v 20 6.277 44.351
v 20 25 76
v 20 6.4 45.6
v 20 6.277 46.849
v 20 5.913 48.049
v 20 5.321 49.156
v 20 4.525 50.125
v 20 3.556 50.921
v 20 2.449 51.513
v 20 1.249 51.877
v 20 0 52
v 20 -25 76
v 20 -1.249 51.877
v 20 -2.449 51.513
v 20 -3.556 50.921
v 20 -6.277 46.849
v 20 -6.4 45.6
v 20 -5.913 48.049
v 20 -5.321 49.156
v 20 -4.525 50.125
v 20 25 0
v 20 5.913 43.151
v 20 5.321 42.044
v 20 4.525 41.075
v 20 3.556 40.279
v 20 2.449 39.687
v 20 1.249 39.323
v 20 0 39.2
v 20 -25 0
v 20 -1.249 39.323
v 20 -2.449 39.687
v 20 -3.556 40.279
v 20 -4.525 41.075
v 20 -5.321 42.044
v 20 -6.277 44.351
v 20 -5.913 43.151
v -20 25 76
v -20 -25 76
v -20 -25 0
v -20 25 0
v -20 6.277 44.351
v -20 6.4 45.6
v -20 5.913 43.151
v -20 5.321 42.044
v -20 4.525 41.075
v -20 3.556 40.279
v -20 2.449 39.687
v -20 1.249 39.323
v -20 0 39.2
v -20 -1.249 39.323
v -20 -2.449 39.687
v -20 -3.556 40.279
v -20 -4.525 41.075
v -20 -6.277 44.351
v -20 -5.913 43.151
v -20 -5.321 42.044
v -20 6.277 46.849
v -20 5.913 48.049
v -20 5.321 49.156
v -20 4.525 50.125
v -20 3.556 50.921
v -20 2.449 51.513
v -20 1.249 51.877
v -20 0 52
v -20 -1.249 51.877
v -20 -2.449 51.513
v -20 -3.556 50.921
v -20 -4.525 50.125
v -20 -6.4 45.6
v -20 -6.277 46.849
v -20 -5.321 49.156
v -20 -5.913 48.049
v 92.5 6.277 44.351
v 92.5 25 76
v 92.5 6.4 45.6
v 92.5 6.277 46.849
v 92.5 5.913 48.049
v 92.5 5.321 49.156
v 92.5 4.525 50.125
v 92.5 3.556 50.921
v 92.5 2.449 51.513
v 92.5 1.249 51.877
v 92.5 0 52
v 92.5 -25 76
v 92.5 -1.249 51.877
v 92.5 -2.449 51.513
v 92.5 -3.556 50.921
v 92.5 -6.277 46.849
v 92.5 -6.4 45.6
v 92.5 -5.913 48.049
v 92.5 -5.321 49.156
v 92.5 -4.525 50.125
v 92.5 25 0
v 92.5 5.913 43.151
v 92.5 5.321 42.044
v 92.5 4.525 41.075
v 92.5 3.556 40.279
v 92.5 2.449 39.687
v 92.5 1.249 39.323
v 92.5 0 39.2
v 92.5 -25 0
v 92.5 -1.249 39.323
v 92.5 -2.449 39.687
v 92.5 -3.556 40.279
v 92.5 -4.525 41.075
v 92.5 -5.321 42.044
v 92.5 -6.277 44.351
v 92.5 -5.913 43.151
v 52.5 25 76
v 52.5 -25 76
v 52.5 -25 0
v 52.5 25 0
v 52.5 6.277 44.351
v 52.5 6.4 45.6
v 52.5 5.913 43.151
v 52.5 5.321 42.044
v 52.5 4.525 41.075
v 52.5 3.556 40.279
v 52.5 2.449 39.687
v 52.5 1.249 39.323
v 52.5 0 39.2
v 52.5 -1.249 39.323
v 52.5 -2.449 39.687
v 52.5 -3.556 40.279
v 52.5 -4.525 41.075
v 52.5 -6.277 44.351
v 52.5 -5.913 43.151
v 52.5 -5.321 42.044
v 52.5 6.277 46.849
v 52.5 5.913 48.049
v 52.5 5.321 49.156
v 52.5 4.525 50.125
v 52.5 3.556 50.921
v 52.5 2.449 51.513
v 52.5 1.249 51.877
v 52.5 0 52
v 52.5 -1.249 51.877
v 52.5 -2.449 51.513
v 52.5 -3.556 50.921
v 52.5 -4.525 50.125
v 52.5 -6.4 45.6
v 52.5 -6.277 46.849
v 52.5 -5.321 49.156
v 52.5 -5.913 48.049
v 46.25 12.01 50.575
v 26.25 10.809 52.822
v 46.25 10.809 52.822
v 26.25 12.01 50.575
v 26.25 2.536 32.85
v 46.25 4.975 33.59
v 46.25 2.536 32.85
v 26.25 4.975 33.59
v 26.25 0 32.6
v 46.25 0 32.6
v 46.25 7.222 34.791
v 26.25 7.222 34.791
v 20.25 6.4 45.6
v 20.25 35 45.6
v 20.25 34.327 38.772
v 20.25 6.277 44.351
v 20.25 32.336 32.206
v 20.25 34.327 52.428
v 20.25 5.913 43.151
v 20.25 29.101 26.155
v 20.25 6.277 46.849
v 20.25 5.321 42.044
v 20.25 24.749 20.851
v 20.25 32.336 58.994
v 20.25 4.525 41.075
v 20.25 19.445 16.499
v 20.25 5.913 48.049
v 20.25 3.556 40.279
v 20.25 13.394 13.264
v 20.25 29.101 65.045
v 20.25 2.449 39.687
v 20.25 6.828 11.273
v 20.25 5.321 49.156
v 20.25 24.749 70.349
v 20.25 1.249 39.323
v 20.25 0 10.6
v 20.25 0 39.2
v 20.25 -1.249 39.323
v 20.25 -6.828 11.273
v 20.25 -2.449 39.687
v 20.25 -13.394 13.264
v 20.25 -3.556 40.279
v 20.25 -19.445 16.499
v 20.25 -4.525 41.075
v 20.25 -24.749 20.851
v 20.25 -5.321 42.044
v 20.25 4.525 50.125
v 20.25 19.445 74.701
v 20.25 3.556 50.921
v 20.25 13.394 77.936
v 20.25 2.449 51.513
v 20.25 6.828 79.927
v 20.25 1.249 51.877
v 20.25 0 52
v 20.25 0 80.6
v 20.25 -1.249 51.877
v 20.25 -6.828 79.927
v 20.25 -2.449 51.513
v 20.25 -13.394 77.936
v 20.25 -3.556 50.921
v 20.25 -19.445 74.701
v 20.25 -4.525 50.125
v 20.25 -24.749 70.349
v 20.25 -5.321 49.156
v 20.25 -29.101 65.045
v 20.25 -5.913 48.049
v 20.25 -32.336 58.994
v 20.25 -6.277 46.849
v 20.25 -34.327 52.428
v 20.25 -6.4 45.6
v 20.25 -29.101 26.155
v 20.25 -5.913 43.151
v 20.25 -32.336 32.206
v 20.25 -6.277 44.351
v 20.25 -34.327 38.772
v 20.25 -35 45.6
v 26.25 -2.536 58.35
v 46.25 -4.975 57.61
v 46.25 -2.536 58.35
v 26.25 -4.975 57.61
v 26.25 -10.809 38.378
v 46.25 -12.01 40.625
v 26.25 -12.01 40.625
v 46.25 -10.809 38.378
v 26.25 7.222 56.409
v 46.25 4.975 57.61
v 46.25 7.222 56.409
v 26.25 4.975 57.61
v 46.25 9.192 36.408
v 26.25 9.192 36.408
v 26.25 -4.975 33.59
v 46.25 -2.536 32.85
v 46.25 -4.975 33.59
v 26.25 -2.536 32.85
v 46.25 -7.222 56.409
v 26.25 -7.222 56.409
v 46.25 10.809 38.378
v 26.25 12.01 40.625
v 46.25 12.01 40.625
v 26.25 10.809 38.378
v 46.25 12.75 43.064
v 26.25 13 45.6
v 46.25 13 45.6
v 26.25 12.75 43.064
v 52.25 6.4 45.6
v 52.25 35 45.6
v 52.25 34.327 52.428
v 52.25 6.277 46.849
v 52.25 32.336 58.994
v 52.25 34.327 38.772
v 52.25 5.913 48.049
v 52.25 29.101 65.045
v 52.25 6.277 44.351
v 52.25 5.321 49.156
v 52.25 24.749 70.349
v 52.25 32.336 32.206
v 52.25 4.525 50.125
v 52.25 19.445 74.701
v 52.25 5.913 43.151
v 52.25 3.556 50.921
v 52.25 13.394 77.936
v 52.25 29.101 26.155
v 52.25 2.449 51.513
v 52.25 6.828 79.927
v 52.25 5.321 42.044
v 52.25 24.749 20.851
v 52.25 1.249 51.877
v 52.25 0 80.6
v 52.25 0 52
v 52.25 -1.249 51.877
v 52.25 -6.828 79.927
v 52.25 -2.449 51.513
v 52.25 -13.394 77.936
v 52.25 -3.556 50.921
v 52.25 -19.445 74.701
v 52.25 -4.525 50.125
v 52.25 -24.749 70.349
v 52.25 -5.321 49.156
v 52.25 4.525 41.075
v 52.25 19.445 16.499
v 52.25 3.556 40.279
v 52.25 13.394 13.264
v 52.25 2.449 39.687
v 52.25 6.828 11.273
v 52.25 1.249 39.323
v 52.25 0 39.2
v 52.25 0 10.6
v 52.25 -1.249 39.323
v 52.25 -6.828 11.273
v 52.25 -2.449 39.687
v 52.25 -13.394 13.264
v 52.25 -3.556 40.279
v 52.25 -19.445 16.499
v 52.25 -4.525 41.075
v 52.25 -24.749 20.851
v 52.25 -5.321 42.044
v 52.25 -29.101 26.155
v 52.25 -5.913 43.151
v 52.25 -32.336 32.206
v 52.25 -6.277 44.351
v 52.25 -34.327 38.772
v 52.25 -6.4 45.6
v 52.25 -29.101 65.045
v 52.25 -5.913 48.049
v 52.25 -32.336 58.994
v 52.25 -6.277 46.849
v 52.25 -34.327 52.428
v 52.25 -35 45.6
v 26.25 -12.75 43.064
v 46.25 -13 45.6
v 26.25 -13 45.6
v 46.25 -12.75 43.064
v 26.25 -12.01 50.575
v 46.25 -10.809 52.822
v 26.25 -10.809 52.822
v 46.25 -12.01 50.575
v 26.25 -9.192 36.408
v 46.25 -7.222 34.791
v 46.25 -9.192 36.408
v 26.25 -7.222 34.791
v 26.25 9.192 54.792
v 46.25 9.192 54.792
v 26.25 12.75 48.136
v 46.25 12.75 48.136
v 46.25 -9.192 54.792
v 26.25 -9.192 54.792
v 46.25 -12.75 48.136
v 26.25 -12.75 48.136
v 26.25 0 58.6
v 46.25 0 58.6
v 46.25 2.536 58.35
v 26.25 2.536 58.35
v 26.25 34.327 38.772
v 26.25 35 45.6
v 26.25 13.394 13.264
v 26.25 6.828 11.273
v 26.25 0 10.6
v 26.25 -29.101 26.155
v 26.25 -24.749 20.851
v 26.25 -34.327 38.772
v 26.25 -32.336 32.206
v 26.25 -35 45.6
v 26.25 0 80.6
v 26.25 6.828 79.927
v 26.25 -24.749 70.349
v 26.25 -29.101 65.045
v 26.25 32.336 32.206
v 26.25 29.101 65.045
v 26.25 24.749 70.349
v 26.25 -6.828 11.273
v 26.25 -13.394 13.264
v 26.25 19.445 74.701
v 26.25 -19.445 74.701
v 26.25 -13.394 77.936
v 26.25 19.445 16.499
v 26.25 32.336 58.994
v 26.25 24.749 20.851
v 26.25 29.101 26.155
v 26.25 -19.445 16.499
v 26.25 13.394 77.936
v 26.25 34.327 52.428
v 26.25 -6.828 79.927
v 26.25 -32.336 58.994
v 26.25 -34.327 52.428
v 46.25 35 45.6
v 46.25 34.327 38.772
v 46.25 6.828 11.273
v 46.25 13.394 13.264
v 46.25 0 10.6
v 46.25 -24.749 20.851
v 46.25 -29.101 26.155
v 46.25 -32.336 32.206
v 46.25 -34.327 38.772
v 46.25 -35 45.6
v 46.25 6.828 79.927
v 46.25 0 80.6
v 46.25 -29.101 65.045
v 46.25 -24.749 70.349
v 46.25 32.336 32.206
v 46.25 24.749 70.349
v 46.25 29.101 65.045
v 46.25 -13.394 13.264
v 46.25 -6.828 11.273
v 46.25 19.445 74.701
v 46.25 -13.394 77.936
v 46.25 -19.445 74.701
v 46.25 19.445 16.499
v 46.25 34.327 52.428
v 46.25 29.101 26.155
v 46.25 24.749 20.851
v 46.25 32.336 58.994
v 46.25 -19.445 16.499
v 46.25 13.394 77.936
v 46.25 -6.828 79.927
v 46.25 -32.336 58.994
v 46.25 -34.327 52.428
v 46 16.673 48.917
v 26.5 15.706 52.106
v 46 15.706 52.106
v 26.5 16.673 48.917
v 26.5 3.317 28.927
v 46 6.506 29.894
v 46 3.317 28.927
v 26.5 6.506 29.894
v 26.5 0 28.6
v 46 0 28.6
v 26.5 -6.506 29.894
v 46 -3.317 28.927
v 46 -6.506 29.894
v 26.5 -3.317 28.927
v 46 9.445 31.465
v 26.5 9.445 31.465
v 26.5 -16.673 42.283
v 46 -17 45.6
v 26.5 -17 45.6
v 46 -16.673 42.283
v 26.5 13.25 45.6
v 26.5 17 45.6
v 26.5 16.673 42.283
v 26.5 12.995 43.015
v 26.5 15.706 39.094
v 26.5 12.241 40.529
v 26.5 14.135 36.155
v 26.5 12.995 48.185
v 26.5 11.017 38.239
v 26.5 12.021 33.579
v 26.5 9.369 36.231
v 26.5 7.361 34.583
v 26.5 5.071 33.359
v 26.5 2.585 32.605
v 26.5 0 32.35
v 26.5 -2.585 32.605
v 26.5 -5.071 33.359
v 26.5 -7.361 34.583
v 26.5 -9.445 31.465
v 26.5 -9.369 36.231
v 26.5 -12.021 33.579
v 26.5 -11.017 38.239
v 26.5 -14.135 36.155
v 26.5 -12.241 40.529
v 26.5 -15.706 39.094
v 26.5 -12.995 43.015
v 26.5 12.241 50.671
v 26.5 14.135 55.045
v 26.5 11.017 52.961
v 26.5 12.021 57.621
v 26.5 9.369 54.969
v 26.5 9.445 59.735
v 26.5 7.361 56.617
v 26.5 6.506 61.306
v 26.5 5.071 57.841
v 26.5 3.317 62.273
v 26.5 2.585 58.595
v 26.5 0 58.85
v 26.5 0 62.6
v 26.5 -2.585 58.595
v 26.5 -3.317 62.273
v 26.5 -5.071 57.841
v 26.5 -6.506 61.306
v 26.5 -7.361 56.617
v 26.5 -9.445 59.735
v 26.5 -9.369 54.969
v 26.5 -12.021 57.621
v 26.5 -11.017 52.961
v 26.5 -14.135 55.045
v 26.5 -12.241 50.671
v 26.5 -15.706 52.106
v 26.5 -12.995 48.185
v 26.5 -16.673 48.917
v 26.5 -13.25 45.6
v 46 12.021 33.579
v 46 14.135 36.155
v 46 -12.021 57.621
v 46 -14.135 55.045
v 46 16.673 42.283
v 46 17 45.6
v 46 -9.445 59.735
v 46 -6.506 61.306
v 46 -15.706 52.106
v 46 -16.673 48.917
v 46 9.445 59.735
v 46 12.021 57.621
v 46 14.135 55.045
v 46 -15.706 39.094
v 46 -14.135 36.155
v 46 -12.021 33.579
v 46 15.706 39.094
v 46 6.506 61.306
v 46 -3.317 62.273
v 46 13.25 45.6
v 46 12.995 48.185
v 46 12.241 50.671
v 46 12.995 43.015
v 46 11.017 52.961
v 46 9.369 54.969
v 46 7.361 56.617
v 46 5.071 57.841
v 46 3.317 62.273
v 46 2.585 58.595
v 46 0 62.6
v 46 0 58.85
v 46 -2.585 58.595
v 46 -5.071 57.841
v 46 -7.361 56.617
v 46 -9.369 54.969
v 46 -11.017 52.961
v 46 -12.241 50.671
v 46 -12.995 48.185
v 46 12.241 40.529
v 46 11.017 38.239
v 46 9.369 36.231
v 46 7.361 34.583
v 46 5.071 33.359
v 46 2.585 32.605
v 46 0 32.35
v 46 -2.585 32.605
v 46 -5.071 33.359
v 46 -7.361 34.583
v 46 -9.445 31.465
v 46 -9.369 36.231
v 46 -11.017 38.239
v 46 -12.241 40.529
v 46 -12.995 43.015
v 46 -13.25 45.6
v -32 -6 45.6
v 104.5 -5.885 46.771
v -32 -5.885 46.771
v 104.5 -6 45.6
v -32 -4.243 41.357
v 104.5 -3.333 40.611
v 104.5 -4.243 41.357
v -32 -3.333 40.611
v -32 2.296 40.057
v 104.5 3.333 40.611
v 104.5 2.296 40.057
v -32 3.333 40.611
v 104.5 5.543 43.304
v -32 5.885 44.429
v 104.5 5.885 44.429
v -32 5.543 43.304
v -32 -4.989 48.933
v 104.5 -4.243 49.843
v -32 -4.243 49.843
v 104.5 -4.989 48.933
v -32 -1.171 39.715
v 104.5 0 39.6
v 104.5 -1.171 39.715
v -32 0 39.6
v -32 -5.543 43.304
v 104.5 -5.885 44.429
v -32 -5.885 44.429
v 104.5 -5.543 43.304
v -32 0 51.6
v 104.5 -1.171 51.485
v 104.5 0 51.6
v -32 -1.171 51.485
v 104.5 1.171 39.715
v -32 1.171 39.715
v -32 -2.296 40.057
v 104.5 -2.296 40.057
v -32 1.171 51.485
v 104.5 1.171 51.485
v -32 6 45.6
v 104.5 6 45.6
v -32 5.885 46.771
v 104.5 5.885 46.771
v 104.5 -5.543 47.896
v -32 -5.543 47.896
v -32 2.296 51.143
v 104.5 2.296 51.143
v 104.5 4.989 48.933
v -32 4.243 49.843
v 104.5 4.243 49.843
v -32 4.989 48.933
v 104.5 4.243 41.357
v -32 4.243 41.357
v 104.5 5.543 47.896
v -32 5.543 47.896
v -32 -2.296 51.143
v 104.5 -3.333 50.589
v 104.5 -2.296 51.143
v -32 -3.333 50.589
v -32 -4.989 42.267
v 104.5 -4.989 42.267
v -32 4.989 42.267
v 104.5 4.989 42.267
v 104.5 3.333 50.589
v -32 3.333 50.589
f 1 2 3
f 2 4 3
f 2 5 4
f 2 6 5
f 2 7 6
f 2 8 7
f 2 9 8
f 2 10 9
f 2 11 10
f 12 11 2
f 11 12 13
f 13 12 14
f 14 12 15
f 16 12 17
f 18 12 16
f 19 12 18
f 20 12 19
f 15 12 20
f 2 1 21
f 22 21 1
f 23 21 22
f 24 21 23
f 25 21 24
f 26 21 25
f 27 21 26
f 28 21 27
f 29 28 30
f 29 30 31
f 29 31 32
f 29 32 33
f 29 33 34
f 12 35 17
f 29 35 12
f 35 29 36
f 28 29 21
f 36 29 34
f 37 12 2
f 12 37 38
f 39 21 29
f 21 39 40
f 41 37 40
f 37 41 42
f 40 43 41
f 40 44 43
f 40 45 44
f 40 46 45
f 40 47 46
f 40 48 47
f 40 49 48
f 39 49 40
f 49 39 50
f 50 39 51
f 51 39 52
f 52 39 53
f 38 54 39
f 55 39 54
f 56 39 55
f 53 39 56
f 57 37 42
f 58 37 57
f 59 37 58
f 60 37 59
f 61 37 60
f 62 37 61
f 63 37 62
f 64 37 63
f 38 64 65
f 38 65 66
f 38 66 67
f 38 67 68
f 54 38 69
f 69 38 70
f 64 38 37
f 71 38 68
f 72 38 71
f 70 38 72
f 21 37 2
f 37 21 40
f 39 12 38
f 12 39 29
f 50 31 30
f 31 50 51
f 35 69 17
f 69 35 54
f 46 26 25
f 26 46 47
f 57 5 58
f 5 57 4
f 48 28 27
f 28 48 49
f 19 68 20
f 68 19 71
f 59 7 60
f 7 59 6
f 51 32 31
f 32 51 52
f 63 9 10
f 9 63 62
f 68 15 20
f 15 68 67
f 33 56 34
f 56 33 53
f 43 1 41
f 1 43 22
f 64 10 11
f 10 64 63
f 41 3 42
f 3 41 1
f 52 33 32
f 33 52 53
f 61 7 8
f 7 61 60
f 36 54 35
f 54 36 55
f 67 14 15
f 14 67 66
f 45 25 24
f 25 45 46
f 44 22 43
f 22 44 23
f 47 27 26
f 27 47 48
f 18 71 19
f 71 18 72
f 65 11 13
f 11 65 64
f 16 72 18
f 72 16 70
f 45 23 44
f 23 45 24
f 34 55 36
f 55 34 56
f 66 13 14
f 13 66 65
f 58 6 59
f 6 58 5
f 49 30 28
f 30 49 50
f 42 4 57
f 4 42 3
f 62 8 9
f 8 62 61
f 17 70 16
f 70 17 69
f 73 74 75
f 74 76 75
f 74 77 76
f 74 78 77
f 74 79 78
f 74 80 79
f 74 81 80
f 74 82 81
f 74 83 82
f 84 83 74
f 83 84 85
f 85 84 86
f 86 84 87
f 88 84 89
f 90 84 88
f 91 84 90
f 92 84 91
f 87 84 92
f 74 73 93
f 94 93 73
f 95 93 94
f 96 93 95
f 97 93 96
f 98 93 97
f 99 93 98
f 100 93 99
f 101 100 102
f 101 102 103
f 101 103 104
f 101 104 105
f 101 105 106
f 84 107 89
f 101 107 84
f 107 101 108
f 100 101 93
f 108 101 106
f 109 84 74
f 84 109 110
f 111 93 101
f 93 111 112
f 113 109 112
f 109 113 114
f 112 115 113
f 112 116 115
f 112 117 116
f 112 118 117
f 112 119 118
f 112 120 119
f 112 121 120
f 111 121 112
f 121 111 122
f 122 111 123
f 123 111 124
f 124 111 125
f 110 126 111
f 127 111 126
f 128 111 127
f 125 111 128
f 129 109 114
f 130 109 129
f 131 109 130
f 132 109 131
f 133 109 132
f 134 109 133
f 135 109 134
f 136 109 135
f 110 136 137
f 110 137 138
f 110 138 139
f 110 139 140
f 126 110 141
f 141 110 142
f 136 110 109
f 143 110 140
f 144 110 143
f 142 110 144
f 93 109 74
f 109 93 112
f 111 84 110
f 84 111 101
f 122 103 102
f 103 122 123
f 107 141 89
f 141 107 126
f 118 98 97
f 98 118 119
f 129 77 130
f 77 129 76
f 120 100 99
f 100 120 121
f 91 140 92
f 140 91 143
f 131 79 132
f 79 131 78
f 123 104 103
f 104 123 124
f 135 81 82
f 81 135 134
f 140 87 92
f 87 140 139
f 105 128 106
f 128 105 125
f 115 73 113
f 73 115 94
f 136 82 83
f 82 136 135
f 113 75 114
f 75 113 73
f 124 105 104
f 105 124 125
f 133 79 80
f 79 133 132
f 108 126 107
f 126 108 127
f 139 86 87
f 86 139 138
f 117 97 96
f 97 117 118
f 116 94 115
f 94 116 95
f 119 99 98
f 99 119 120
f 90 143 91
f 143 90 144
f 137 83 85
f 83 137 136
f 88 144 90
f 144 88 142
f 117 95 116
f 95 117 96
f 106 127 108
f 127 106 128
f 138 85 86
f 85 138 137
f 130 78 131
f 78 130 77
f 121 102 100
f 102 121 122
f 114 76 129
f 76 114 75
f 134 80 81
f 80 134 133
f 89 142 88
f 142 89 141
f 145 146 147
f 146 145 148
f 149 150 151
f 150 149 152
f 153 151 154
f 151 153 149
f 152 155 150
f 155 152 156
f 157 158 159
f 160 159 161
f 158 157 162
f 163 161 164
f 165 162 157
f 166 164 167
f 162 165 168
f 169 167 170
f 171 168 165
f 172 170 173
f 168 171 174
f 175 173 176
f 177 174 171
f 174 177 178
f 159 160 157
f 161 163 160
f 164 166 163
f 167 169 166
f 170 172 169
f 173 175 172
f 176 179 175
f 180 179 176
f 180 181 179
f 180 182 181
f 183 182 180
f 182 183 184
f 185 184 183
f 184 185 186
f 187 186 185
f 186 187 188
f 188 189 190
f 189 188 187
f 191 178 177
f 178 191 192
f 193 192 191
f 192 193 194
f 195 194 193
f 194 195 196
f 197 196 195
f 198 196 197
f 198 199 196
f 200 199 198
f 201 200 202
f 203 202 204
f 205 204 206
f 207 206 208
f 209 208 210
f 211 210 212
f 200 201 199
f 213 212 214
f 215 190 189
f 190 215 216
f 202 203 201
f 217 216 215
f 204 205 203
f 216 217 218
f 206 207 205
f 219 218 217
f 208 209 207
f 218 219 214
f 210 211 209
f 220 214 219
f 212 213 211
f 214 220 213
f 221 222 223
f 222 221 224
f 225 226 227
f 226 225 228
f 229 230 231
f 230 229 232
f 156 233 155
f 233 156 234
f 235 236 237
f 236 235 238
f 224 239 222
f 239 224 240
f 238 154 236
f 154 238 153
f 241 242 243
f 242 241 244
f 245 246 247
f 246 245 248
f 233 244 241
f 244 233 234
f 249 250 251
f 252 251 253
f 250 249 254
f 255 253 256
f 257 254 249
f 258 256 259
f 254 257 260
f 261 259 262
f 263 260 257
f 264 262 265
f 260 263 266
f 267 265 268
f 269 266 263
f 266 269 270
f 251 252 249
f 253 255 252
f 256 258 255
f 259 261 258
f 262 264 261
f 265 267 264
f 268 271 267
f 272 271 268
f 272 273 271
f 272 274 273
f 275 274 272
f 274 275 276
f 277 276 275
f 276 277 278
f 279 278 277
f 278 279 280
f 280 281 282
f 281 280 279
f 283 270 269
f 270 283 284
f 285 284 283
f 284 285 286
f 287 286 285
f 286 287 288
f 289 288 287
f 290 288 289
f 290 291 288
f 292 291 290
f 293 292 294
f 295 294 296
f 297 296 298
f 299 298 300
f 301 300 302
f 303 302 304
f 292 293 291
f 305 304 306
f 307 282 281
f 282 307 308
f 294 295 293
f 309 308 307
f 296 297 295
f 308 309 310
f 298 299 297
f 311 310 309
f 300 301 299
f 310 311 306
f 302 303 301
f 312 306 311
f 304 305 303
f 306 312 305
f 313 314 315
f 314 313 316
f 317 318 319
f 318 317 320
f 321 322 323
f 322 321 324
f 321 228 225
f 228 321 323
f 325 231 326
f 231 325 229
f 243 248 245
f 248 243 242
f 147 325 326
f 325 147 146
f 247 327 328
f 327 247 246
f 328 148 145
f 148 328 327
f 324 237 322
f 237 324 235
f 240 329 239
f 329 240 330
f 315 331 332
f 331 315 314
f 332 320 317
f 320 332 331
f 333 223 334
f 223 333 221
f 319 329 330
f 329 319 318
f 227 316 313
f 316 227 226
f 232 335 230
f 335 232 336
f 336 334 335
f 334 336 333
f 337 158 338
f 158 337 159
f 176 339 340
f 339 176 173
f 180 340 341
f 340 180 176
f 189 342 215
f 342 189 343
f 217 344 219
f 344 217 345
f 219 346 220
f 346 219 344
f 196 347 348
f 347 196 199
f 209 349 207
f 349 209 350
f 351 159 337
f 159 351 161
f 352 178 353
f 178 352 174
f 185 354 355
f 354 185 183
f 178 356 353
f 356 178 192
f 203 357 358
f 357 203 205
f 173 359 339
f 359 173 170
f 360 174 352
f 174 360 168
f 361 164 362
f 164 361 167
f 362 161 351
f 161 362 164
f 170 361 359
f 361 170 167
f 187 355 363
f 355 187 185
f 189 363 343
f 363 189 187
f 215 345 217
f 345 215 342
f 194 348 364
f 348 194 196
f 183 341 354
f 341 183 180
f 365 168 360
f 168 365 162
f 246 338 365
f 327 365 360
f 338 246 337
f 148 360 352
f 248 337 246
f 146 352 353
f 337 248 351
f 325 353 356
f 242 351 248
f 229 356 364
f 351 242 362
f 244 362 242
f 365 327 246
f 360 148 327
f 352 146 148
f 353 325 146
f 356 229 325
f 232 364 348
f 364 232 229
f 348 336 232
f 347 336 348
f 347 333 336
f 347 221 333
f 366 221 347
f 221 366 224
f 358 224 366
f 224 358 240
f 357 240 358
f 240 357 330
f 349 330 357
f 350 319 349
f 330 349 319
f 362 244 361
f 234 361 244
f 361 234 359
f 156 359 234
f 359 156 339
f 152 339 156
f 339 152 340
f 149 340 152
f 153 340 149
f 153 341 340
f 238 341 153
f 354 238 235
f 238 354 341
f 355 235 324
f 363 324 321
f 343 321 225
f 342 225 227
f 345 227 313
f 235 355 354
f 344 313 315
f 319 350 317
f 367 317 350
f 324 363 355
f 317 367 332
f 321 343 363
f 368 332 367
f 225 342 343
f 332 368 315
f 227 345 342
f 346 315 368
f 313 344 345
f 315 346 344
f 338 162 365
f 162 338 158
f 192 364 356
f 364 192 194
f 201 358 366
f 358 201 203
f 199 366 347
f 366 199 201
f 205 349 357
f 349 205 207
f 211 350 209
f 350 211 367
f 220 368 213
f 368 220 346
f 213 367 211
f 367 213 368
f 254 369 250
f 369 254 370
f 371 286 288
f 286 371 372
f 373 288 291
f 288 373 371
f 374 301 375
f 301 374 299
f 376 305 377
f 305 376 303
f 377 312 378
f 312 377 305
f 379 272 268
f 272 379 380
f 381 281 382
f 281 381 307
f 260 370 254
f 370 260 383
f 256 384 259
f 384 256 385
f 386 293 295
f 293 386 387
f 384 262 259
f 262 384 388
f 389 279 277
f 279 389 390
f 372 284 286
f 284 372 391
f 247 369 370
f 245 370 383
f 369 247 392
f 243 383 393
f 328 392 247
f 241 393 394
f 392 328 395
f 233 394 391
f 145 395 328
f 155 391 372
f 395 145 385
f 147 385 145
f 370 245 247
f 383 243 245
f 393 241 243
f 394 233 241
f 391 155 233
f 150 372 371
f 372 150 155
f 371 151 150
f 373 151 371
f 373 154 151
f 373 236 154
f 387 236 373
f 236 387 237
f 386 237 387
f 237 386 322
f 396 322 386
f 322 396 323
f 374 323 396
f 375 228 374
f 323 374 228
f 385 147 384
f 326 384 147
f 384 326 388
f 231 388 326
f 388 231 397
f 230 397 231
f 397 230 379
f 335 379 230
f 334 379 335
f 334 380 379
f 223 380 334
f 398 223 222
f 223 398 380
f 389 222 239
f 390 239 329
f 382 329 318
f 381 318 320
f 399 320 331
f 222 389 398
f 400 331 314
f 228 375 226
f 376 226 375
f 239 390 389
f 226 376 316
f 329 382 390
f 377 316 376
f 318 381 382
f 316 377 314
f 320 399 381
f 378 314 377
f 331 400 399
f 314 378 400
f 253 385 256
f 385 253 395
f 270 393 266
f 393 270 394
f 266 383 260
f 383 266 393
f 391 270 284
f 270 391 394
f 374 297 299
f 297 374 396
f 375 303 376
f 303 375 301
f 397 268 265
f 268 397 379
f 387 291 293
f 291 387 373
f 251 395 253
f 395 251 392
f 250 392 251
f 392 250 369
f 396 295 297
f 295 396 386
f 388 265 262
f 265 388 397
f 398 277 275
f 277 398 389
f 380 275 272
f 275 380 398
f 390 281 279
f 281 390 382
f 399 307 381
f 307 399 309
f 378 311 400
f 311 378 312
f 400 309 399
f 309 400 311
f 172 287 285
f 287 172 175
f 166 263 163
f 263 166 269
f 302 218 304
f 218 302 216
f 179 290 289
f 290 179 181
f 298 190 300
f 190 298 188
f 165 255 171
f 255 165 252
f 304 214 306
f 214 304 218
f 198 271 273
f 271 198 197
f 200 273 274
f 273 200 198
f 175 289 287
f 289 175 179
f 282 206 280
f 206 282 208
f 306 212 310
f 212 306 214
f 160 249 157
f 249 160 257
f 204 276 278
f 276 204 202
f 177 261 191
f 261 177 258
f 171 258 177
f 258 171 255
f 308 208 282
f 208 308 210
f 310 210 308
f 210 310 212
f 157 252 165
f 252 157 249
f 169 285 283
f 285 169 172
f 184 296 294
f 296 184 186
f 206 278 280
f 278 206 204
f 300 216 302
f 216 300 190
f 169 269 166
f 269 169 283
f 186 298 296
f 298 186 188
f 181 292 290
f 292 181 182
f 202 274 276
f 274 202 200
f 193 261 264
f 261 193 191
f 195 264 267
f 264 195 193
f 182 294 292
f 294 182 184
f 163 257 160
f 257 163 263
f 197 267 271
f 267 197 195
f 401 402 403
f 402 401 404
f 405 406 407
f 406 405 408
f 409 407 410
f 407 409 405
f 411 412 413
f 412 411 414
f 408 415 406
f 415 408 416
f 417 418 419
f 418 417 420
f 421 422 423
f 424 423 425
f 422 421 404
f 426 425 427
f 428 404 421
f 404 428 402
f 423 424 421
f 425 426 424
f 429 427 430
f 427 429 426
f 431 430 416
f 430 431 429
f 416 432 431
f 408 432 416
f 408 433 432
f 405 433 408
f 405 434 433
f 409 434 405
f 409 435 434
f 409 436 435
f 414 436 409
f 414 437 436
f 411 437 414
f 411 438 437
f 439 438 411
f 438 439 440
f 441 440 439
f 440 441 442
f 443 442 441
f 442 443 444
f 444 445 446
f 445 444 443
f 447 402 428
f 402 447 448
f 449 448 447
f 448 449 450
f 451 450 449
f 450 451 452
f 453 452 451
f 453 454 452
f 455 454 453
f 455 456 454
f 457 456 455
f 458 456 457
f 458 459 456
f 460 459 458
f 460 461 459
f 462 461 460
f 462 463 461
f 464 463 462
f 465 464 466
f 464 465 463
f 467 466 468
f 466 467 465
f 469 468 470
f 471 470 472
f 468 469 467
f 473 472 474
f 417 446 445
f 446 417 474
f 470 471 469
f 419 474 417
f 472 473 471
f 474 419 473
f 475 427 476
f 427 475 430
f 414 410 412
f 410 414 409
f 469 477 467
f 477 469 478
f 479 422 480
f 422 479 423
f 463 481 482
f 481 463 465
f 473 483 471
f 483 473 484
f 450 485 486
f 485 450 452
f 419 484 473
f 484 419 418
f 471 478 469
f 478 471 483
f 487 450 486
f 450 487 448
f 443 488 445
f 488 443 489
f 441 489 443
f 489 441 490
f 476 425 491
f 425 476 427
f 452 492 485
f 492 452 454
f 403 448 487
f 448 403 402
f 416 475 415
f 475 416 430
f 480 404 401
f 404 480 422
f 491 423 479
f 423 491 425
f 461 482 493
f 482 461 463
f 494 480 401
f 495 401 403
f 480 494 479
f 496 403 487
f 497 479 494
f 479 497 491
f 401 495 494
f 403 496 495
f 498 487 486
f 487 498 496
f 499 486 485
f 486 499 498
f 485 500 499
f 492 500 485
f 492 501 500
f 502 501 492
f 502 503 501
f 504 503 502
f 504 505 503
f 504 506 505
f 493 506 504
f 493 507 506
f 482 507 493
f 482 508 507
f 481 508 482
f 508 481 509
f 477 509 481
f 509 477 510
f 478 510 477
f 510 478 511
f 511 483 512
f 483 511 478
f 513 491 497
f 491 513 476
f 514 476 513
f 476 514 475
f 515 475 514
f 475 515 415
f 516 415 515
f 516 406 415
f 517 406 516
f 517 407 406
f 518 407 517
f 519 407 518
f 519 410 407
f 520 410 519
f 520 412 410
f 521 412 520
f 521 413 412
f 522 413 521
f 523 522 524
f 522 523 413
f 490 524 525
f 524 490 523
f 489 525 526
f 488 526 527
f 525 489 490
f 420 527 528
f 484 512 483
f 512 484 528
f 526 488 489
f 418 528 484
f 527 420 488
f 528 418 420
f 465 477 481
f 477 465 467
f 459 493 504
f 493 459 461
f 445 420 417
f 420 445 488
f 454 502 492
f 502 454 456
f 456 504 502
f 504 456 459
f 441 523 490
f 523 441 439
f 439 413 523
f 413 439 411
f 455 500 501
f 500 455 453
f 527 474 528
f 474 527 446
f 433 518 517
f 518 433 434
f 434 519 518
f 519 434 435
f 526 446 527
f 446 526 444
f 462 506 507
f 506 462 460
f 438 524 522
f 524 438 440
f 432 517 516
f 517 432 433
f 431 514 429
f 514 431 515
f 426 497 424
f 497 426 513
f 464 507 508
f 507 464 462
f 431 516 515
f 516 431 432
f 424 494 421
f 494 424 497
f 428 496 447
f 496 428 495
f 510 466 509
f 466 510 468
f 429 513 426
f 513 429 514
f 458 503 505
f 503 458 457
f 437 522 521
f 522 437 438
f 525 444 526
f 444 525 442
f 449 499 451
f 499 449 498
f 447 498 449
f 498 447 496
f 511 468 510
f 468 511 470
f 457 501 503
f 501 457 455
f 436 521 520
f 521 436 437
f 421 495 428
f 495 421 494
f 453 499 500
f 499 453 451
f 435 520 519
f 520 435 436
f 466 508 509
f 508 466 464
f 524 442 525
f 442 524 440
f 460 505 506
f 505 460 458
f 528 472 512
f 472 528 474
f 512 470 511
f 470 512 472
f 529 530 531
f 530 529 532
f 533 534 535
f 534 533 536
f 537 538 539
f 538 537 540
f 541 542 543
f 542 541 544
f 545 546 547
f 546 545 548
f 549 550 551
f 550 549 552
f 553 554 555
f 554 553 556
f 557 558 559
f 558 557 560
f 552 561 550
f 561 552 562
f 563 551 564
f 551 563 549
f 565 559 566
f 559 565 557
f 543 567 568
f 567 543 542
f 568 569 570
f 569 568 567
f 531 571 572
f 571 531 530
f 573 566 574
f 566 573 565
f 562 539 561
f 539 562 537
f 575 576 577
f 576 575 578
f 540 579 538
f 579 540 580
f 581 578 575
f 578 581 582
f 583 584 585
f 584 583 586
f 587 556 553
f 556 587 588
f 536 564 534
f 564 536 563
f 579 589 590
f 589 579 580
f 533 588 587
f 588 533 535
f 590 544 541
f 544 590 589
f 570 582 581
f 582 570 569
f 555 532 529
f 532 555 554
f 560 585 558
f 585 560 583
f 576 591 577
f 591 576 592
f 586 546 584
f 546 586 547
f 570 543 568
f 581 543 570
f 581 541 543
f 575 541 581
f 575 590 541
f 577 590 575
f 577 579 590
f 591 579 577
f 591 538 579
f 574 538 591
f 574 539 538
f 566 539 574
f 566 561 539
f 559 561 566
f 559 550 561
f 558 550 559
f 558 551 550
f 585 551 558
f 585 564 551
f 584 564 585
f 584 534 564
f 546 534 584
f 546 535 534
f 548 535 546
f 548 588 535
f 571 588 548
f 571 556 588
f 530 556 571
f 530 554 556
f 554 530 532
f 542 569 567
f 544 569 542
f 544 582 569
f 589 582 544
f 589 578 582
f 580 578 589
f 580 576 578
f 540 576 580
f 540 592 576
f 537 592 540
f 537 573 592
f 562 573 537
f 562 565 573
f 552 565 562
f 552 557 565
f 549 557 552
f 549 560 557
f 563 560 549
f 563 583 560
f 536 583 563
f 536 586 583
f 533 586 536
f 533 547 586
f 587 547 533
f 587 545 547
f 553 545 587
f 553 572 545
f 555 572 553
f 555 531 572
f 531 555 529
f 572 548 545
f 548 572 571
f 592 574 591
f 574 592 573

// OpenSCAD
$fn = 32;

// ------------------------------------------------------------------------
// Pulley assembly: d70 pulley with a belt, shaft d12
// Every part is its own module, assembly() places them once.
// ------------------------------------------------------------------------

// --- part 1 ---
module support1() {
  difference() {
    translate([-20, -25, 0]) cube([40, 50, 76]);
    translate([0, 0, 45.6]) rotate([0, 90, 0]) cylinder(h = 42, d = 12.8, center = true);
  }
}

// --- part 2 ---
module support2() {
  difference() {
    translate([-20, -25, 0]) cube([40, 50, 76]);
    translate([0, 0, 45.6]) rotate([0, 90, 0]) cylinder(h = 42, d = 12.8, center = true);
  }
}

// --- part 3 ---
module shaft() {
  translate([0, 0, -68.25]) cylinder(h = 136.5, d = 12);
}

// --- part 4 ---
module pulley() {
  difference() {
    union() {
      cylinder(h = 32, d = 26);
      cylinder(h = 6, d = 70);
      translate([0, 0, 26]) cylinder(h = 6, d = 70);
    }
    translate([0, 0, -1]) cylinder(h = 34, d = 12.8);
  }
}

// --- part 5 ---
module belt() {
  difference() {
      translate([0, 0, 0]) cylinder(h = 19.5, d = 34);
      translate([0, 0, -1]) cylinder(h = 21.5, d = 26.5);
    }
}

// --- assembly ---
module assembly() {
  translate([0, 0, 0]) rotate([0, 0, 0]) support1();
  translate([72.5, 0, 0]) rotate([0, 0, 0]) support2();
  translate([36.25, 0, 45.6]) rotate([0, 90, 0]) shaft();
  translate([20.25, 0, 45.6]) rotate([0, 90, 0]) pulley();
  translate([26.5, 0, 45.6]) rotate([0, 90, 0]) belt();
}

assembly();
